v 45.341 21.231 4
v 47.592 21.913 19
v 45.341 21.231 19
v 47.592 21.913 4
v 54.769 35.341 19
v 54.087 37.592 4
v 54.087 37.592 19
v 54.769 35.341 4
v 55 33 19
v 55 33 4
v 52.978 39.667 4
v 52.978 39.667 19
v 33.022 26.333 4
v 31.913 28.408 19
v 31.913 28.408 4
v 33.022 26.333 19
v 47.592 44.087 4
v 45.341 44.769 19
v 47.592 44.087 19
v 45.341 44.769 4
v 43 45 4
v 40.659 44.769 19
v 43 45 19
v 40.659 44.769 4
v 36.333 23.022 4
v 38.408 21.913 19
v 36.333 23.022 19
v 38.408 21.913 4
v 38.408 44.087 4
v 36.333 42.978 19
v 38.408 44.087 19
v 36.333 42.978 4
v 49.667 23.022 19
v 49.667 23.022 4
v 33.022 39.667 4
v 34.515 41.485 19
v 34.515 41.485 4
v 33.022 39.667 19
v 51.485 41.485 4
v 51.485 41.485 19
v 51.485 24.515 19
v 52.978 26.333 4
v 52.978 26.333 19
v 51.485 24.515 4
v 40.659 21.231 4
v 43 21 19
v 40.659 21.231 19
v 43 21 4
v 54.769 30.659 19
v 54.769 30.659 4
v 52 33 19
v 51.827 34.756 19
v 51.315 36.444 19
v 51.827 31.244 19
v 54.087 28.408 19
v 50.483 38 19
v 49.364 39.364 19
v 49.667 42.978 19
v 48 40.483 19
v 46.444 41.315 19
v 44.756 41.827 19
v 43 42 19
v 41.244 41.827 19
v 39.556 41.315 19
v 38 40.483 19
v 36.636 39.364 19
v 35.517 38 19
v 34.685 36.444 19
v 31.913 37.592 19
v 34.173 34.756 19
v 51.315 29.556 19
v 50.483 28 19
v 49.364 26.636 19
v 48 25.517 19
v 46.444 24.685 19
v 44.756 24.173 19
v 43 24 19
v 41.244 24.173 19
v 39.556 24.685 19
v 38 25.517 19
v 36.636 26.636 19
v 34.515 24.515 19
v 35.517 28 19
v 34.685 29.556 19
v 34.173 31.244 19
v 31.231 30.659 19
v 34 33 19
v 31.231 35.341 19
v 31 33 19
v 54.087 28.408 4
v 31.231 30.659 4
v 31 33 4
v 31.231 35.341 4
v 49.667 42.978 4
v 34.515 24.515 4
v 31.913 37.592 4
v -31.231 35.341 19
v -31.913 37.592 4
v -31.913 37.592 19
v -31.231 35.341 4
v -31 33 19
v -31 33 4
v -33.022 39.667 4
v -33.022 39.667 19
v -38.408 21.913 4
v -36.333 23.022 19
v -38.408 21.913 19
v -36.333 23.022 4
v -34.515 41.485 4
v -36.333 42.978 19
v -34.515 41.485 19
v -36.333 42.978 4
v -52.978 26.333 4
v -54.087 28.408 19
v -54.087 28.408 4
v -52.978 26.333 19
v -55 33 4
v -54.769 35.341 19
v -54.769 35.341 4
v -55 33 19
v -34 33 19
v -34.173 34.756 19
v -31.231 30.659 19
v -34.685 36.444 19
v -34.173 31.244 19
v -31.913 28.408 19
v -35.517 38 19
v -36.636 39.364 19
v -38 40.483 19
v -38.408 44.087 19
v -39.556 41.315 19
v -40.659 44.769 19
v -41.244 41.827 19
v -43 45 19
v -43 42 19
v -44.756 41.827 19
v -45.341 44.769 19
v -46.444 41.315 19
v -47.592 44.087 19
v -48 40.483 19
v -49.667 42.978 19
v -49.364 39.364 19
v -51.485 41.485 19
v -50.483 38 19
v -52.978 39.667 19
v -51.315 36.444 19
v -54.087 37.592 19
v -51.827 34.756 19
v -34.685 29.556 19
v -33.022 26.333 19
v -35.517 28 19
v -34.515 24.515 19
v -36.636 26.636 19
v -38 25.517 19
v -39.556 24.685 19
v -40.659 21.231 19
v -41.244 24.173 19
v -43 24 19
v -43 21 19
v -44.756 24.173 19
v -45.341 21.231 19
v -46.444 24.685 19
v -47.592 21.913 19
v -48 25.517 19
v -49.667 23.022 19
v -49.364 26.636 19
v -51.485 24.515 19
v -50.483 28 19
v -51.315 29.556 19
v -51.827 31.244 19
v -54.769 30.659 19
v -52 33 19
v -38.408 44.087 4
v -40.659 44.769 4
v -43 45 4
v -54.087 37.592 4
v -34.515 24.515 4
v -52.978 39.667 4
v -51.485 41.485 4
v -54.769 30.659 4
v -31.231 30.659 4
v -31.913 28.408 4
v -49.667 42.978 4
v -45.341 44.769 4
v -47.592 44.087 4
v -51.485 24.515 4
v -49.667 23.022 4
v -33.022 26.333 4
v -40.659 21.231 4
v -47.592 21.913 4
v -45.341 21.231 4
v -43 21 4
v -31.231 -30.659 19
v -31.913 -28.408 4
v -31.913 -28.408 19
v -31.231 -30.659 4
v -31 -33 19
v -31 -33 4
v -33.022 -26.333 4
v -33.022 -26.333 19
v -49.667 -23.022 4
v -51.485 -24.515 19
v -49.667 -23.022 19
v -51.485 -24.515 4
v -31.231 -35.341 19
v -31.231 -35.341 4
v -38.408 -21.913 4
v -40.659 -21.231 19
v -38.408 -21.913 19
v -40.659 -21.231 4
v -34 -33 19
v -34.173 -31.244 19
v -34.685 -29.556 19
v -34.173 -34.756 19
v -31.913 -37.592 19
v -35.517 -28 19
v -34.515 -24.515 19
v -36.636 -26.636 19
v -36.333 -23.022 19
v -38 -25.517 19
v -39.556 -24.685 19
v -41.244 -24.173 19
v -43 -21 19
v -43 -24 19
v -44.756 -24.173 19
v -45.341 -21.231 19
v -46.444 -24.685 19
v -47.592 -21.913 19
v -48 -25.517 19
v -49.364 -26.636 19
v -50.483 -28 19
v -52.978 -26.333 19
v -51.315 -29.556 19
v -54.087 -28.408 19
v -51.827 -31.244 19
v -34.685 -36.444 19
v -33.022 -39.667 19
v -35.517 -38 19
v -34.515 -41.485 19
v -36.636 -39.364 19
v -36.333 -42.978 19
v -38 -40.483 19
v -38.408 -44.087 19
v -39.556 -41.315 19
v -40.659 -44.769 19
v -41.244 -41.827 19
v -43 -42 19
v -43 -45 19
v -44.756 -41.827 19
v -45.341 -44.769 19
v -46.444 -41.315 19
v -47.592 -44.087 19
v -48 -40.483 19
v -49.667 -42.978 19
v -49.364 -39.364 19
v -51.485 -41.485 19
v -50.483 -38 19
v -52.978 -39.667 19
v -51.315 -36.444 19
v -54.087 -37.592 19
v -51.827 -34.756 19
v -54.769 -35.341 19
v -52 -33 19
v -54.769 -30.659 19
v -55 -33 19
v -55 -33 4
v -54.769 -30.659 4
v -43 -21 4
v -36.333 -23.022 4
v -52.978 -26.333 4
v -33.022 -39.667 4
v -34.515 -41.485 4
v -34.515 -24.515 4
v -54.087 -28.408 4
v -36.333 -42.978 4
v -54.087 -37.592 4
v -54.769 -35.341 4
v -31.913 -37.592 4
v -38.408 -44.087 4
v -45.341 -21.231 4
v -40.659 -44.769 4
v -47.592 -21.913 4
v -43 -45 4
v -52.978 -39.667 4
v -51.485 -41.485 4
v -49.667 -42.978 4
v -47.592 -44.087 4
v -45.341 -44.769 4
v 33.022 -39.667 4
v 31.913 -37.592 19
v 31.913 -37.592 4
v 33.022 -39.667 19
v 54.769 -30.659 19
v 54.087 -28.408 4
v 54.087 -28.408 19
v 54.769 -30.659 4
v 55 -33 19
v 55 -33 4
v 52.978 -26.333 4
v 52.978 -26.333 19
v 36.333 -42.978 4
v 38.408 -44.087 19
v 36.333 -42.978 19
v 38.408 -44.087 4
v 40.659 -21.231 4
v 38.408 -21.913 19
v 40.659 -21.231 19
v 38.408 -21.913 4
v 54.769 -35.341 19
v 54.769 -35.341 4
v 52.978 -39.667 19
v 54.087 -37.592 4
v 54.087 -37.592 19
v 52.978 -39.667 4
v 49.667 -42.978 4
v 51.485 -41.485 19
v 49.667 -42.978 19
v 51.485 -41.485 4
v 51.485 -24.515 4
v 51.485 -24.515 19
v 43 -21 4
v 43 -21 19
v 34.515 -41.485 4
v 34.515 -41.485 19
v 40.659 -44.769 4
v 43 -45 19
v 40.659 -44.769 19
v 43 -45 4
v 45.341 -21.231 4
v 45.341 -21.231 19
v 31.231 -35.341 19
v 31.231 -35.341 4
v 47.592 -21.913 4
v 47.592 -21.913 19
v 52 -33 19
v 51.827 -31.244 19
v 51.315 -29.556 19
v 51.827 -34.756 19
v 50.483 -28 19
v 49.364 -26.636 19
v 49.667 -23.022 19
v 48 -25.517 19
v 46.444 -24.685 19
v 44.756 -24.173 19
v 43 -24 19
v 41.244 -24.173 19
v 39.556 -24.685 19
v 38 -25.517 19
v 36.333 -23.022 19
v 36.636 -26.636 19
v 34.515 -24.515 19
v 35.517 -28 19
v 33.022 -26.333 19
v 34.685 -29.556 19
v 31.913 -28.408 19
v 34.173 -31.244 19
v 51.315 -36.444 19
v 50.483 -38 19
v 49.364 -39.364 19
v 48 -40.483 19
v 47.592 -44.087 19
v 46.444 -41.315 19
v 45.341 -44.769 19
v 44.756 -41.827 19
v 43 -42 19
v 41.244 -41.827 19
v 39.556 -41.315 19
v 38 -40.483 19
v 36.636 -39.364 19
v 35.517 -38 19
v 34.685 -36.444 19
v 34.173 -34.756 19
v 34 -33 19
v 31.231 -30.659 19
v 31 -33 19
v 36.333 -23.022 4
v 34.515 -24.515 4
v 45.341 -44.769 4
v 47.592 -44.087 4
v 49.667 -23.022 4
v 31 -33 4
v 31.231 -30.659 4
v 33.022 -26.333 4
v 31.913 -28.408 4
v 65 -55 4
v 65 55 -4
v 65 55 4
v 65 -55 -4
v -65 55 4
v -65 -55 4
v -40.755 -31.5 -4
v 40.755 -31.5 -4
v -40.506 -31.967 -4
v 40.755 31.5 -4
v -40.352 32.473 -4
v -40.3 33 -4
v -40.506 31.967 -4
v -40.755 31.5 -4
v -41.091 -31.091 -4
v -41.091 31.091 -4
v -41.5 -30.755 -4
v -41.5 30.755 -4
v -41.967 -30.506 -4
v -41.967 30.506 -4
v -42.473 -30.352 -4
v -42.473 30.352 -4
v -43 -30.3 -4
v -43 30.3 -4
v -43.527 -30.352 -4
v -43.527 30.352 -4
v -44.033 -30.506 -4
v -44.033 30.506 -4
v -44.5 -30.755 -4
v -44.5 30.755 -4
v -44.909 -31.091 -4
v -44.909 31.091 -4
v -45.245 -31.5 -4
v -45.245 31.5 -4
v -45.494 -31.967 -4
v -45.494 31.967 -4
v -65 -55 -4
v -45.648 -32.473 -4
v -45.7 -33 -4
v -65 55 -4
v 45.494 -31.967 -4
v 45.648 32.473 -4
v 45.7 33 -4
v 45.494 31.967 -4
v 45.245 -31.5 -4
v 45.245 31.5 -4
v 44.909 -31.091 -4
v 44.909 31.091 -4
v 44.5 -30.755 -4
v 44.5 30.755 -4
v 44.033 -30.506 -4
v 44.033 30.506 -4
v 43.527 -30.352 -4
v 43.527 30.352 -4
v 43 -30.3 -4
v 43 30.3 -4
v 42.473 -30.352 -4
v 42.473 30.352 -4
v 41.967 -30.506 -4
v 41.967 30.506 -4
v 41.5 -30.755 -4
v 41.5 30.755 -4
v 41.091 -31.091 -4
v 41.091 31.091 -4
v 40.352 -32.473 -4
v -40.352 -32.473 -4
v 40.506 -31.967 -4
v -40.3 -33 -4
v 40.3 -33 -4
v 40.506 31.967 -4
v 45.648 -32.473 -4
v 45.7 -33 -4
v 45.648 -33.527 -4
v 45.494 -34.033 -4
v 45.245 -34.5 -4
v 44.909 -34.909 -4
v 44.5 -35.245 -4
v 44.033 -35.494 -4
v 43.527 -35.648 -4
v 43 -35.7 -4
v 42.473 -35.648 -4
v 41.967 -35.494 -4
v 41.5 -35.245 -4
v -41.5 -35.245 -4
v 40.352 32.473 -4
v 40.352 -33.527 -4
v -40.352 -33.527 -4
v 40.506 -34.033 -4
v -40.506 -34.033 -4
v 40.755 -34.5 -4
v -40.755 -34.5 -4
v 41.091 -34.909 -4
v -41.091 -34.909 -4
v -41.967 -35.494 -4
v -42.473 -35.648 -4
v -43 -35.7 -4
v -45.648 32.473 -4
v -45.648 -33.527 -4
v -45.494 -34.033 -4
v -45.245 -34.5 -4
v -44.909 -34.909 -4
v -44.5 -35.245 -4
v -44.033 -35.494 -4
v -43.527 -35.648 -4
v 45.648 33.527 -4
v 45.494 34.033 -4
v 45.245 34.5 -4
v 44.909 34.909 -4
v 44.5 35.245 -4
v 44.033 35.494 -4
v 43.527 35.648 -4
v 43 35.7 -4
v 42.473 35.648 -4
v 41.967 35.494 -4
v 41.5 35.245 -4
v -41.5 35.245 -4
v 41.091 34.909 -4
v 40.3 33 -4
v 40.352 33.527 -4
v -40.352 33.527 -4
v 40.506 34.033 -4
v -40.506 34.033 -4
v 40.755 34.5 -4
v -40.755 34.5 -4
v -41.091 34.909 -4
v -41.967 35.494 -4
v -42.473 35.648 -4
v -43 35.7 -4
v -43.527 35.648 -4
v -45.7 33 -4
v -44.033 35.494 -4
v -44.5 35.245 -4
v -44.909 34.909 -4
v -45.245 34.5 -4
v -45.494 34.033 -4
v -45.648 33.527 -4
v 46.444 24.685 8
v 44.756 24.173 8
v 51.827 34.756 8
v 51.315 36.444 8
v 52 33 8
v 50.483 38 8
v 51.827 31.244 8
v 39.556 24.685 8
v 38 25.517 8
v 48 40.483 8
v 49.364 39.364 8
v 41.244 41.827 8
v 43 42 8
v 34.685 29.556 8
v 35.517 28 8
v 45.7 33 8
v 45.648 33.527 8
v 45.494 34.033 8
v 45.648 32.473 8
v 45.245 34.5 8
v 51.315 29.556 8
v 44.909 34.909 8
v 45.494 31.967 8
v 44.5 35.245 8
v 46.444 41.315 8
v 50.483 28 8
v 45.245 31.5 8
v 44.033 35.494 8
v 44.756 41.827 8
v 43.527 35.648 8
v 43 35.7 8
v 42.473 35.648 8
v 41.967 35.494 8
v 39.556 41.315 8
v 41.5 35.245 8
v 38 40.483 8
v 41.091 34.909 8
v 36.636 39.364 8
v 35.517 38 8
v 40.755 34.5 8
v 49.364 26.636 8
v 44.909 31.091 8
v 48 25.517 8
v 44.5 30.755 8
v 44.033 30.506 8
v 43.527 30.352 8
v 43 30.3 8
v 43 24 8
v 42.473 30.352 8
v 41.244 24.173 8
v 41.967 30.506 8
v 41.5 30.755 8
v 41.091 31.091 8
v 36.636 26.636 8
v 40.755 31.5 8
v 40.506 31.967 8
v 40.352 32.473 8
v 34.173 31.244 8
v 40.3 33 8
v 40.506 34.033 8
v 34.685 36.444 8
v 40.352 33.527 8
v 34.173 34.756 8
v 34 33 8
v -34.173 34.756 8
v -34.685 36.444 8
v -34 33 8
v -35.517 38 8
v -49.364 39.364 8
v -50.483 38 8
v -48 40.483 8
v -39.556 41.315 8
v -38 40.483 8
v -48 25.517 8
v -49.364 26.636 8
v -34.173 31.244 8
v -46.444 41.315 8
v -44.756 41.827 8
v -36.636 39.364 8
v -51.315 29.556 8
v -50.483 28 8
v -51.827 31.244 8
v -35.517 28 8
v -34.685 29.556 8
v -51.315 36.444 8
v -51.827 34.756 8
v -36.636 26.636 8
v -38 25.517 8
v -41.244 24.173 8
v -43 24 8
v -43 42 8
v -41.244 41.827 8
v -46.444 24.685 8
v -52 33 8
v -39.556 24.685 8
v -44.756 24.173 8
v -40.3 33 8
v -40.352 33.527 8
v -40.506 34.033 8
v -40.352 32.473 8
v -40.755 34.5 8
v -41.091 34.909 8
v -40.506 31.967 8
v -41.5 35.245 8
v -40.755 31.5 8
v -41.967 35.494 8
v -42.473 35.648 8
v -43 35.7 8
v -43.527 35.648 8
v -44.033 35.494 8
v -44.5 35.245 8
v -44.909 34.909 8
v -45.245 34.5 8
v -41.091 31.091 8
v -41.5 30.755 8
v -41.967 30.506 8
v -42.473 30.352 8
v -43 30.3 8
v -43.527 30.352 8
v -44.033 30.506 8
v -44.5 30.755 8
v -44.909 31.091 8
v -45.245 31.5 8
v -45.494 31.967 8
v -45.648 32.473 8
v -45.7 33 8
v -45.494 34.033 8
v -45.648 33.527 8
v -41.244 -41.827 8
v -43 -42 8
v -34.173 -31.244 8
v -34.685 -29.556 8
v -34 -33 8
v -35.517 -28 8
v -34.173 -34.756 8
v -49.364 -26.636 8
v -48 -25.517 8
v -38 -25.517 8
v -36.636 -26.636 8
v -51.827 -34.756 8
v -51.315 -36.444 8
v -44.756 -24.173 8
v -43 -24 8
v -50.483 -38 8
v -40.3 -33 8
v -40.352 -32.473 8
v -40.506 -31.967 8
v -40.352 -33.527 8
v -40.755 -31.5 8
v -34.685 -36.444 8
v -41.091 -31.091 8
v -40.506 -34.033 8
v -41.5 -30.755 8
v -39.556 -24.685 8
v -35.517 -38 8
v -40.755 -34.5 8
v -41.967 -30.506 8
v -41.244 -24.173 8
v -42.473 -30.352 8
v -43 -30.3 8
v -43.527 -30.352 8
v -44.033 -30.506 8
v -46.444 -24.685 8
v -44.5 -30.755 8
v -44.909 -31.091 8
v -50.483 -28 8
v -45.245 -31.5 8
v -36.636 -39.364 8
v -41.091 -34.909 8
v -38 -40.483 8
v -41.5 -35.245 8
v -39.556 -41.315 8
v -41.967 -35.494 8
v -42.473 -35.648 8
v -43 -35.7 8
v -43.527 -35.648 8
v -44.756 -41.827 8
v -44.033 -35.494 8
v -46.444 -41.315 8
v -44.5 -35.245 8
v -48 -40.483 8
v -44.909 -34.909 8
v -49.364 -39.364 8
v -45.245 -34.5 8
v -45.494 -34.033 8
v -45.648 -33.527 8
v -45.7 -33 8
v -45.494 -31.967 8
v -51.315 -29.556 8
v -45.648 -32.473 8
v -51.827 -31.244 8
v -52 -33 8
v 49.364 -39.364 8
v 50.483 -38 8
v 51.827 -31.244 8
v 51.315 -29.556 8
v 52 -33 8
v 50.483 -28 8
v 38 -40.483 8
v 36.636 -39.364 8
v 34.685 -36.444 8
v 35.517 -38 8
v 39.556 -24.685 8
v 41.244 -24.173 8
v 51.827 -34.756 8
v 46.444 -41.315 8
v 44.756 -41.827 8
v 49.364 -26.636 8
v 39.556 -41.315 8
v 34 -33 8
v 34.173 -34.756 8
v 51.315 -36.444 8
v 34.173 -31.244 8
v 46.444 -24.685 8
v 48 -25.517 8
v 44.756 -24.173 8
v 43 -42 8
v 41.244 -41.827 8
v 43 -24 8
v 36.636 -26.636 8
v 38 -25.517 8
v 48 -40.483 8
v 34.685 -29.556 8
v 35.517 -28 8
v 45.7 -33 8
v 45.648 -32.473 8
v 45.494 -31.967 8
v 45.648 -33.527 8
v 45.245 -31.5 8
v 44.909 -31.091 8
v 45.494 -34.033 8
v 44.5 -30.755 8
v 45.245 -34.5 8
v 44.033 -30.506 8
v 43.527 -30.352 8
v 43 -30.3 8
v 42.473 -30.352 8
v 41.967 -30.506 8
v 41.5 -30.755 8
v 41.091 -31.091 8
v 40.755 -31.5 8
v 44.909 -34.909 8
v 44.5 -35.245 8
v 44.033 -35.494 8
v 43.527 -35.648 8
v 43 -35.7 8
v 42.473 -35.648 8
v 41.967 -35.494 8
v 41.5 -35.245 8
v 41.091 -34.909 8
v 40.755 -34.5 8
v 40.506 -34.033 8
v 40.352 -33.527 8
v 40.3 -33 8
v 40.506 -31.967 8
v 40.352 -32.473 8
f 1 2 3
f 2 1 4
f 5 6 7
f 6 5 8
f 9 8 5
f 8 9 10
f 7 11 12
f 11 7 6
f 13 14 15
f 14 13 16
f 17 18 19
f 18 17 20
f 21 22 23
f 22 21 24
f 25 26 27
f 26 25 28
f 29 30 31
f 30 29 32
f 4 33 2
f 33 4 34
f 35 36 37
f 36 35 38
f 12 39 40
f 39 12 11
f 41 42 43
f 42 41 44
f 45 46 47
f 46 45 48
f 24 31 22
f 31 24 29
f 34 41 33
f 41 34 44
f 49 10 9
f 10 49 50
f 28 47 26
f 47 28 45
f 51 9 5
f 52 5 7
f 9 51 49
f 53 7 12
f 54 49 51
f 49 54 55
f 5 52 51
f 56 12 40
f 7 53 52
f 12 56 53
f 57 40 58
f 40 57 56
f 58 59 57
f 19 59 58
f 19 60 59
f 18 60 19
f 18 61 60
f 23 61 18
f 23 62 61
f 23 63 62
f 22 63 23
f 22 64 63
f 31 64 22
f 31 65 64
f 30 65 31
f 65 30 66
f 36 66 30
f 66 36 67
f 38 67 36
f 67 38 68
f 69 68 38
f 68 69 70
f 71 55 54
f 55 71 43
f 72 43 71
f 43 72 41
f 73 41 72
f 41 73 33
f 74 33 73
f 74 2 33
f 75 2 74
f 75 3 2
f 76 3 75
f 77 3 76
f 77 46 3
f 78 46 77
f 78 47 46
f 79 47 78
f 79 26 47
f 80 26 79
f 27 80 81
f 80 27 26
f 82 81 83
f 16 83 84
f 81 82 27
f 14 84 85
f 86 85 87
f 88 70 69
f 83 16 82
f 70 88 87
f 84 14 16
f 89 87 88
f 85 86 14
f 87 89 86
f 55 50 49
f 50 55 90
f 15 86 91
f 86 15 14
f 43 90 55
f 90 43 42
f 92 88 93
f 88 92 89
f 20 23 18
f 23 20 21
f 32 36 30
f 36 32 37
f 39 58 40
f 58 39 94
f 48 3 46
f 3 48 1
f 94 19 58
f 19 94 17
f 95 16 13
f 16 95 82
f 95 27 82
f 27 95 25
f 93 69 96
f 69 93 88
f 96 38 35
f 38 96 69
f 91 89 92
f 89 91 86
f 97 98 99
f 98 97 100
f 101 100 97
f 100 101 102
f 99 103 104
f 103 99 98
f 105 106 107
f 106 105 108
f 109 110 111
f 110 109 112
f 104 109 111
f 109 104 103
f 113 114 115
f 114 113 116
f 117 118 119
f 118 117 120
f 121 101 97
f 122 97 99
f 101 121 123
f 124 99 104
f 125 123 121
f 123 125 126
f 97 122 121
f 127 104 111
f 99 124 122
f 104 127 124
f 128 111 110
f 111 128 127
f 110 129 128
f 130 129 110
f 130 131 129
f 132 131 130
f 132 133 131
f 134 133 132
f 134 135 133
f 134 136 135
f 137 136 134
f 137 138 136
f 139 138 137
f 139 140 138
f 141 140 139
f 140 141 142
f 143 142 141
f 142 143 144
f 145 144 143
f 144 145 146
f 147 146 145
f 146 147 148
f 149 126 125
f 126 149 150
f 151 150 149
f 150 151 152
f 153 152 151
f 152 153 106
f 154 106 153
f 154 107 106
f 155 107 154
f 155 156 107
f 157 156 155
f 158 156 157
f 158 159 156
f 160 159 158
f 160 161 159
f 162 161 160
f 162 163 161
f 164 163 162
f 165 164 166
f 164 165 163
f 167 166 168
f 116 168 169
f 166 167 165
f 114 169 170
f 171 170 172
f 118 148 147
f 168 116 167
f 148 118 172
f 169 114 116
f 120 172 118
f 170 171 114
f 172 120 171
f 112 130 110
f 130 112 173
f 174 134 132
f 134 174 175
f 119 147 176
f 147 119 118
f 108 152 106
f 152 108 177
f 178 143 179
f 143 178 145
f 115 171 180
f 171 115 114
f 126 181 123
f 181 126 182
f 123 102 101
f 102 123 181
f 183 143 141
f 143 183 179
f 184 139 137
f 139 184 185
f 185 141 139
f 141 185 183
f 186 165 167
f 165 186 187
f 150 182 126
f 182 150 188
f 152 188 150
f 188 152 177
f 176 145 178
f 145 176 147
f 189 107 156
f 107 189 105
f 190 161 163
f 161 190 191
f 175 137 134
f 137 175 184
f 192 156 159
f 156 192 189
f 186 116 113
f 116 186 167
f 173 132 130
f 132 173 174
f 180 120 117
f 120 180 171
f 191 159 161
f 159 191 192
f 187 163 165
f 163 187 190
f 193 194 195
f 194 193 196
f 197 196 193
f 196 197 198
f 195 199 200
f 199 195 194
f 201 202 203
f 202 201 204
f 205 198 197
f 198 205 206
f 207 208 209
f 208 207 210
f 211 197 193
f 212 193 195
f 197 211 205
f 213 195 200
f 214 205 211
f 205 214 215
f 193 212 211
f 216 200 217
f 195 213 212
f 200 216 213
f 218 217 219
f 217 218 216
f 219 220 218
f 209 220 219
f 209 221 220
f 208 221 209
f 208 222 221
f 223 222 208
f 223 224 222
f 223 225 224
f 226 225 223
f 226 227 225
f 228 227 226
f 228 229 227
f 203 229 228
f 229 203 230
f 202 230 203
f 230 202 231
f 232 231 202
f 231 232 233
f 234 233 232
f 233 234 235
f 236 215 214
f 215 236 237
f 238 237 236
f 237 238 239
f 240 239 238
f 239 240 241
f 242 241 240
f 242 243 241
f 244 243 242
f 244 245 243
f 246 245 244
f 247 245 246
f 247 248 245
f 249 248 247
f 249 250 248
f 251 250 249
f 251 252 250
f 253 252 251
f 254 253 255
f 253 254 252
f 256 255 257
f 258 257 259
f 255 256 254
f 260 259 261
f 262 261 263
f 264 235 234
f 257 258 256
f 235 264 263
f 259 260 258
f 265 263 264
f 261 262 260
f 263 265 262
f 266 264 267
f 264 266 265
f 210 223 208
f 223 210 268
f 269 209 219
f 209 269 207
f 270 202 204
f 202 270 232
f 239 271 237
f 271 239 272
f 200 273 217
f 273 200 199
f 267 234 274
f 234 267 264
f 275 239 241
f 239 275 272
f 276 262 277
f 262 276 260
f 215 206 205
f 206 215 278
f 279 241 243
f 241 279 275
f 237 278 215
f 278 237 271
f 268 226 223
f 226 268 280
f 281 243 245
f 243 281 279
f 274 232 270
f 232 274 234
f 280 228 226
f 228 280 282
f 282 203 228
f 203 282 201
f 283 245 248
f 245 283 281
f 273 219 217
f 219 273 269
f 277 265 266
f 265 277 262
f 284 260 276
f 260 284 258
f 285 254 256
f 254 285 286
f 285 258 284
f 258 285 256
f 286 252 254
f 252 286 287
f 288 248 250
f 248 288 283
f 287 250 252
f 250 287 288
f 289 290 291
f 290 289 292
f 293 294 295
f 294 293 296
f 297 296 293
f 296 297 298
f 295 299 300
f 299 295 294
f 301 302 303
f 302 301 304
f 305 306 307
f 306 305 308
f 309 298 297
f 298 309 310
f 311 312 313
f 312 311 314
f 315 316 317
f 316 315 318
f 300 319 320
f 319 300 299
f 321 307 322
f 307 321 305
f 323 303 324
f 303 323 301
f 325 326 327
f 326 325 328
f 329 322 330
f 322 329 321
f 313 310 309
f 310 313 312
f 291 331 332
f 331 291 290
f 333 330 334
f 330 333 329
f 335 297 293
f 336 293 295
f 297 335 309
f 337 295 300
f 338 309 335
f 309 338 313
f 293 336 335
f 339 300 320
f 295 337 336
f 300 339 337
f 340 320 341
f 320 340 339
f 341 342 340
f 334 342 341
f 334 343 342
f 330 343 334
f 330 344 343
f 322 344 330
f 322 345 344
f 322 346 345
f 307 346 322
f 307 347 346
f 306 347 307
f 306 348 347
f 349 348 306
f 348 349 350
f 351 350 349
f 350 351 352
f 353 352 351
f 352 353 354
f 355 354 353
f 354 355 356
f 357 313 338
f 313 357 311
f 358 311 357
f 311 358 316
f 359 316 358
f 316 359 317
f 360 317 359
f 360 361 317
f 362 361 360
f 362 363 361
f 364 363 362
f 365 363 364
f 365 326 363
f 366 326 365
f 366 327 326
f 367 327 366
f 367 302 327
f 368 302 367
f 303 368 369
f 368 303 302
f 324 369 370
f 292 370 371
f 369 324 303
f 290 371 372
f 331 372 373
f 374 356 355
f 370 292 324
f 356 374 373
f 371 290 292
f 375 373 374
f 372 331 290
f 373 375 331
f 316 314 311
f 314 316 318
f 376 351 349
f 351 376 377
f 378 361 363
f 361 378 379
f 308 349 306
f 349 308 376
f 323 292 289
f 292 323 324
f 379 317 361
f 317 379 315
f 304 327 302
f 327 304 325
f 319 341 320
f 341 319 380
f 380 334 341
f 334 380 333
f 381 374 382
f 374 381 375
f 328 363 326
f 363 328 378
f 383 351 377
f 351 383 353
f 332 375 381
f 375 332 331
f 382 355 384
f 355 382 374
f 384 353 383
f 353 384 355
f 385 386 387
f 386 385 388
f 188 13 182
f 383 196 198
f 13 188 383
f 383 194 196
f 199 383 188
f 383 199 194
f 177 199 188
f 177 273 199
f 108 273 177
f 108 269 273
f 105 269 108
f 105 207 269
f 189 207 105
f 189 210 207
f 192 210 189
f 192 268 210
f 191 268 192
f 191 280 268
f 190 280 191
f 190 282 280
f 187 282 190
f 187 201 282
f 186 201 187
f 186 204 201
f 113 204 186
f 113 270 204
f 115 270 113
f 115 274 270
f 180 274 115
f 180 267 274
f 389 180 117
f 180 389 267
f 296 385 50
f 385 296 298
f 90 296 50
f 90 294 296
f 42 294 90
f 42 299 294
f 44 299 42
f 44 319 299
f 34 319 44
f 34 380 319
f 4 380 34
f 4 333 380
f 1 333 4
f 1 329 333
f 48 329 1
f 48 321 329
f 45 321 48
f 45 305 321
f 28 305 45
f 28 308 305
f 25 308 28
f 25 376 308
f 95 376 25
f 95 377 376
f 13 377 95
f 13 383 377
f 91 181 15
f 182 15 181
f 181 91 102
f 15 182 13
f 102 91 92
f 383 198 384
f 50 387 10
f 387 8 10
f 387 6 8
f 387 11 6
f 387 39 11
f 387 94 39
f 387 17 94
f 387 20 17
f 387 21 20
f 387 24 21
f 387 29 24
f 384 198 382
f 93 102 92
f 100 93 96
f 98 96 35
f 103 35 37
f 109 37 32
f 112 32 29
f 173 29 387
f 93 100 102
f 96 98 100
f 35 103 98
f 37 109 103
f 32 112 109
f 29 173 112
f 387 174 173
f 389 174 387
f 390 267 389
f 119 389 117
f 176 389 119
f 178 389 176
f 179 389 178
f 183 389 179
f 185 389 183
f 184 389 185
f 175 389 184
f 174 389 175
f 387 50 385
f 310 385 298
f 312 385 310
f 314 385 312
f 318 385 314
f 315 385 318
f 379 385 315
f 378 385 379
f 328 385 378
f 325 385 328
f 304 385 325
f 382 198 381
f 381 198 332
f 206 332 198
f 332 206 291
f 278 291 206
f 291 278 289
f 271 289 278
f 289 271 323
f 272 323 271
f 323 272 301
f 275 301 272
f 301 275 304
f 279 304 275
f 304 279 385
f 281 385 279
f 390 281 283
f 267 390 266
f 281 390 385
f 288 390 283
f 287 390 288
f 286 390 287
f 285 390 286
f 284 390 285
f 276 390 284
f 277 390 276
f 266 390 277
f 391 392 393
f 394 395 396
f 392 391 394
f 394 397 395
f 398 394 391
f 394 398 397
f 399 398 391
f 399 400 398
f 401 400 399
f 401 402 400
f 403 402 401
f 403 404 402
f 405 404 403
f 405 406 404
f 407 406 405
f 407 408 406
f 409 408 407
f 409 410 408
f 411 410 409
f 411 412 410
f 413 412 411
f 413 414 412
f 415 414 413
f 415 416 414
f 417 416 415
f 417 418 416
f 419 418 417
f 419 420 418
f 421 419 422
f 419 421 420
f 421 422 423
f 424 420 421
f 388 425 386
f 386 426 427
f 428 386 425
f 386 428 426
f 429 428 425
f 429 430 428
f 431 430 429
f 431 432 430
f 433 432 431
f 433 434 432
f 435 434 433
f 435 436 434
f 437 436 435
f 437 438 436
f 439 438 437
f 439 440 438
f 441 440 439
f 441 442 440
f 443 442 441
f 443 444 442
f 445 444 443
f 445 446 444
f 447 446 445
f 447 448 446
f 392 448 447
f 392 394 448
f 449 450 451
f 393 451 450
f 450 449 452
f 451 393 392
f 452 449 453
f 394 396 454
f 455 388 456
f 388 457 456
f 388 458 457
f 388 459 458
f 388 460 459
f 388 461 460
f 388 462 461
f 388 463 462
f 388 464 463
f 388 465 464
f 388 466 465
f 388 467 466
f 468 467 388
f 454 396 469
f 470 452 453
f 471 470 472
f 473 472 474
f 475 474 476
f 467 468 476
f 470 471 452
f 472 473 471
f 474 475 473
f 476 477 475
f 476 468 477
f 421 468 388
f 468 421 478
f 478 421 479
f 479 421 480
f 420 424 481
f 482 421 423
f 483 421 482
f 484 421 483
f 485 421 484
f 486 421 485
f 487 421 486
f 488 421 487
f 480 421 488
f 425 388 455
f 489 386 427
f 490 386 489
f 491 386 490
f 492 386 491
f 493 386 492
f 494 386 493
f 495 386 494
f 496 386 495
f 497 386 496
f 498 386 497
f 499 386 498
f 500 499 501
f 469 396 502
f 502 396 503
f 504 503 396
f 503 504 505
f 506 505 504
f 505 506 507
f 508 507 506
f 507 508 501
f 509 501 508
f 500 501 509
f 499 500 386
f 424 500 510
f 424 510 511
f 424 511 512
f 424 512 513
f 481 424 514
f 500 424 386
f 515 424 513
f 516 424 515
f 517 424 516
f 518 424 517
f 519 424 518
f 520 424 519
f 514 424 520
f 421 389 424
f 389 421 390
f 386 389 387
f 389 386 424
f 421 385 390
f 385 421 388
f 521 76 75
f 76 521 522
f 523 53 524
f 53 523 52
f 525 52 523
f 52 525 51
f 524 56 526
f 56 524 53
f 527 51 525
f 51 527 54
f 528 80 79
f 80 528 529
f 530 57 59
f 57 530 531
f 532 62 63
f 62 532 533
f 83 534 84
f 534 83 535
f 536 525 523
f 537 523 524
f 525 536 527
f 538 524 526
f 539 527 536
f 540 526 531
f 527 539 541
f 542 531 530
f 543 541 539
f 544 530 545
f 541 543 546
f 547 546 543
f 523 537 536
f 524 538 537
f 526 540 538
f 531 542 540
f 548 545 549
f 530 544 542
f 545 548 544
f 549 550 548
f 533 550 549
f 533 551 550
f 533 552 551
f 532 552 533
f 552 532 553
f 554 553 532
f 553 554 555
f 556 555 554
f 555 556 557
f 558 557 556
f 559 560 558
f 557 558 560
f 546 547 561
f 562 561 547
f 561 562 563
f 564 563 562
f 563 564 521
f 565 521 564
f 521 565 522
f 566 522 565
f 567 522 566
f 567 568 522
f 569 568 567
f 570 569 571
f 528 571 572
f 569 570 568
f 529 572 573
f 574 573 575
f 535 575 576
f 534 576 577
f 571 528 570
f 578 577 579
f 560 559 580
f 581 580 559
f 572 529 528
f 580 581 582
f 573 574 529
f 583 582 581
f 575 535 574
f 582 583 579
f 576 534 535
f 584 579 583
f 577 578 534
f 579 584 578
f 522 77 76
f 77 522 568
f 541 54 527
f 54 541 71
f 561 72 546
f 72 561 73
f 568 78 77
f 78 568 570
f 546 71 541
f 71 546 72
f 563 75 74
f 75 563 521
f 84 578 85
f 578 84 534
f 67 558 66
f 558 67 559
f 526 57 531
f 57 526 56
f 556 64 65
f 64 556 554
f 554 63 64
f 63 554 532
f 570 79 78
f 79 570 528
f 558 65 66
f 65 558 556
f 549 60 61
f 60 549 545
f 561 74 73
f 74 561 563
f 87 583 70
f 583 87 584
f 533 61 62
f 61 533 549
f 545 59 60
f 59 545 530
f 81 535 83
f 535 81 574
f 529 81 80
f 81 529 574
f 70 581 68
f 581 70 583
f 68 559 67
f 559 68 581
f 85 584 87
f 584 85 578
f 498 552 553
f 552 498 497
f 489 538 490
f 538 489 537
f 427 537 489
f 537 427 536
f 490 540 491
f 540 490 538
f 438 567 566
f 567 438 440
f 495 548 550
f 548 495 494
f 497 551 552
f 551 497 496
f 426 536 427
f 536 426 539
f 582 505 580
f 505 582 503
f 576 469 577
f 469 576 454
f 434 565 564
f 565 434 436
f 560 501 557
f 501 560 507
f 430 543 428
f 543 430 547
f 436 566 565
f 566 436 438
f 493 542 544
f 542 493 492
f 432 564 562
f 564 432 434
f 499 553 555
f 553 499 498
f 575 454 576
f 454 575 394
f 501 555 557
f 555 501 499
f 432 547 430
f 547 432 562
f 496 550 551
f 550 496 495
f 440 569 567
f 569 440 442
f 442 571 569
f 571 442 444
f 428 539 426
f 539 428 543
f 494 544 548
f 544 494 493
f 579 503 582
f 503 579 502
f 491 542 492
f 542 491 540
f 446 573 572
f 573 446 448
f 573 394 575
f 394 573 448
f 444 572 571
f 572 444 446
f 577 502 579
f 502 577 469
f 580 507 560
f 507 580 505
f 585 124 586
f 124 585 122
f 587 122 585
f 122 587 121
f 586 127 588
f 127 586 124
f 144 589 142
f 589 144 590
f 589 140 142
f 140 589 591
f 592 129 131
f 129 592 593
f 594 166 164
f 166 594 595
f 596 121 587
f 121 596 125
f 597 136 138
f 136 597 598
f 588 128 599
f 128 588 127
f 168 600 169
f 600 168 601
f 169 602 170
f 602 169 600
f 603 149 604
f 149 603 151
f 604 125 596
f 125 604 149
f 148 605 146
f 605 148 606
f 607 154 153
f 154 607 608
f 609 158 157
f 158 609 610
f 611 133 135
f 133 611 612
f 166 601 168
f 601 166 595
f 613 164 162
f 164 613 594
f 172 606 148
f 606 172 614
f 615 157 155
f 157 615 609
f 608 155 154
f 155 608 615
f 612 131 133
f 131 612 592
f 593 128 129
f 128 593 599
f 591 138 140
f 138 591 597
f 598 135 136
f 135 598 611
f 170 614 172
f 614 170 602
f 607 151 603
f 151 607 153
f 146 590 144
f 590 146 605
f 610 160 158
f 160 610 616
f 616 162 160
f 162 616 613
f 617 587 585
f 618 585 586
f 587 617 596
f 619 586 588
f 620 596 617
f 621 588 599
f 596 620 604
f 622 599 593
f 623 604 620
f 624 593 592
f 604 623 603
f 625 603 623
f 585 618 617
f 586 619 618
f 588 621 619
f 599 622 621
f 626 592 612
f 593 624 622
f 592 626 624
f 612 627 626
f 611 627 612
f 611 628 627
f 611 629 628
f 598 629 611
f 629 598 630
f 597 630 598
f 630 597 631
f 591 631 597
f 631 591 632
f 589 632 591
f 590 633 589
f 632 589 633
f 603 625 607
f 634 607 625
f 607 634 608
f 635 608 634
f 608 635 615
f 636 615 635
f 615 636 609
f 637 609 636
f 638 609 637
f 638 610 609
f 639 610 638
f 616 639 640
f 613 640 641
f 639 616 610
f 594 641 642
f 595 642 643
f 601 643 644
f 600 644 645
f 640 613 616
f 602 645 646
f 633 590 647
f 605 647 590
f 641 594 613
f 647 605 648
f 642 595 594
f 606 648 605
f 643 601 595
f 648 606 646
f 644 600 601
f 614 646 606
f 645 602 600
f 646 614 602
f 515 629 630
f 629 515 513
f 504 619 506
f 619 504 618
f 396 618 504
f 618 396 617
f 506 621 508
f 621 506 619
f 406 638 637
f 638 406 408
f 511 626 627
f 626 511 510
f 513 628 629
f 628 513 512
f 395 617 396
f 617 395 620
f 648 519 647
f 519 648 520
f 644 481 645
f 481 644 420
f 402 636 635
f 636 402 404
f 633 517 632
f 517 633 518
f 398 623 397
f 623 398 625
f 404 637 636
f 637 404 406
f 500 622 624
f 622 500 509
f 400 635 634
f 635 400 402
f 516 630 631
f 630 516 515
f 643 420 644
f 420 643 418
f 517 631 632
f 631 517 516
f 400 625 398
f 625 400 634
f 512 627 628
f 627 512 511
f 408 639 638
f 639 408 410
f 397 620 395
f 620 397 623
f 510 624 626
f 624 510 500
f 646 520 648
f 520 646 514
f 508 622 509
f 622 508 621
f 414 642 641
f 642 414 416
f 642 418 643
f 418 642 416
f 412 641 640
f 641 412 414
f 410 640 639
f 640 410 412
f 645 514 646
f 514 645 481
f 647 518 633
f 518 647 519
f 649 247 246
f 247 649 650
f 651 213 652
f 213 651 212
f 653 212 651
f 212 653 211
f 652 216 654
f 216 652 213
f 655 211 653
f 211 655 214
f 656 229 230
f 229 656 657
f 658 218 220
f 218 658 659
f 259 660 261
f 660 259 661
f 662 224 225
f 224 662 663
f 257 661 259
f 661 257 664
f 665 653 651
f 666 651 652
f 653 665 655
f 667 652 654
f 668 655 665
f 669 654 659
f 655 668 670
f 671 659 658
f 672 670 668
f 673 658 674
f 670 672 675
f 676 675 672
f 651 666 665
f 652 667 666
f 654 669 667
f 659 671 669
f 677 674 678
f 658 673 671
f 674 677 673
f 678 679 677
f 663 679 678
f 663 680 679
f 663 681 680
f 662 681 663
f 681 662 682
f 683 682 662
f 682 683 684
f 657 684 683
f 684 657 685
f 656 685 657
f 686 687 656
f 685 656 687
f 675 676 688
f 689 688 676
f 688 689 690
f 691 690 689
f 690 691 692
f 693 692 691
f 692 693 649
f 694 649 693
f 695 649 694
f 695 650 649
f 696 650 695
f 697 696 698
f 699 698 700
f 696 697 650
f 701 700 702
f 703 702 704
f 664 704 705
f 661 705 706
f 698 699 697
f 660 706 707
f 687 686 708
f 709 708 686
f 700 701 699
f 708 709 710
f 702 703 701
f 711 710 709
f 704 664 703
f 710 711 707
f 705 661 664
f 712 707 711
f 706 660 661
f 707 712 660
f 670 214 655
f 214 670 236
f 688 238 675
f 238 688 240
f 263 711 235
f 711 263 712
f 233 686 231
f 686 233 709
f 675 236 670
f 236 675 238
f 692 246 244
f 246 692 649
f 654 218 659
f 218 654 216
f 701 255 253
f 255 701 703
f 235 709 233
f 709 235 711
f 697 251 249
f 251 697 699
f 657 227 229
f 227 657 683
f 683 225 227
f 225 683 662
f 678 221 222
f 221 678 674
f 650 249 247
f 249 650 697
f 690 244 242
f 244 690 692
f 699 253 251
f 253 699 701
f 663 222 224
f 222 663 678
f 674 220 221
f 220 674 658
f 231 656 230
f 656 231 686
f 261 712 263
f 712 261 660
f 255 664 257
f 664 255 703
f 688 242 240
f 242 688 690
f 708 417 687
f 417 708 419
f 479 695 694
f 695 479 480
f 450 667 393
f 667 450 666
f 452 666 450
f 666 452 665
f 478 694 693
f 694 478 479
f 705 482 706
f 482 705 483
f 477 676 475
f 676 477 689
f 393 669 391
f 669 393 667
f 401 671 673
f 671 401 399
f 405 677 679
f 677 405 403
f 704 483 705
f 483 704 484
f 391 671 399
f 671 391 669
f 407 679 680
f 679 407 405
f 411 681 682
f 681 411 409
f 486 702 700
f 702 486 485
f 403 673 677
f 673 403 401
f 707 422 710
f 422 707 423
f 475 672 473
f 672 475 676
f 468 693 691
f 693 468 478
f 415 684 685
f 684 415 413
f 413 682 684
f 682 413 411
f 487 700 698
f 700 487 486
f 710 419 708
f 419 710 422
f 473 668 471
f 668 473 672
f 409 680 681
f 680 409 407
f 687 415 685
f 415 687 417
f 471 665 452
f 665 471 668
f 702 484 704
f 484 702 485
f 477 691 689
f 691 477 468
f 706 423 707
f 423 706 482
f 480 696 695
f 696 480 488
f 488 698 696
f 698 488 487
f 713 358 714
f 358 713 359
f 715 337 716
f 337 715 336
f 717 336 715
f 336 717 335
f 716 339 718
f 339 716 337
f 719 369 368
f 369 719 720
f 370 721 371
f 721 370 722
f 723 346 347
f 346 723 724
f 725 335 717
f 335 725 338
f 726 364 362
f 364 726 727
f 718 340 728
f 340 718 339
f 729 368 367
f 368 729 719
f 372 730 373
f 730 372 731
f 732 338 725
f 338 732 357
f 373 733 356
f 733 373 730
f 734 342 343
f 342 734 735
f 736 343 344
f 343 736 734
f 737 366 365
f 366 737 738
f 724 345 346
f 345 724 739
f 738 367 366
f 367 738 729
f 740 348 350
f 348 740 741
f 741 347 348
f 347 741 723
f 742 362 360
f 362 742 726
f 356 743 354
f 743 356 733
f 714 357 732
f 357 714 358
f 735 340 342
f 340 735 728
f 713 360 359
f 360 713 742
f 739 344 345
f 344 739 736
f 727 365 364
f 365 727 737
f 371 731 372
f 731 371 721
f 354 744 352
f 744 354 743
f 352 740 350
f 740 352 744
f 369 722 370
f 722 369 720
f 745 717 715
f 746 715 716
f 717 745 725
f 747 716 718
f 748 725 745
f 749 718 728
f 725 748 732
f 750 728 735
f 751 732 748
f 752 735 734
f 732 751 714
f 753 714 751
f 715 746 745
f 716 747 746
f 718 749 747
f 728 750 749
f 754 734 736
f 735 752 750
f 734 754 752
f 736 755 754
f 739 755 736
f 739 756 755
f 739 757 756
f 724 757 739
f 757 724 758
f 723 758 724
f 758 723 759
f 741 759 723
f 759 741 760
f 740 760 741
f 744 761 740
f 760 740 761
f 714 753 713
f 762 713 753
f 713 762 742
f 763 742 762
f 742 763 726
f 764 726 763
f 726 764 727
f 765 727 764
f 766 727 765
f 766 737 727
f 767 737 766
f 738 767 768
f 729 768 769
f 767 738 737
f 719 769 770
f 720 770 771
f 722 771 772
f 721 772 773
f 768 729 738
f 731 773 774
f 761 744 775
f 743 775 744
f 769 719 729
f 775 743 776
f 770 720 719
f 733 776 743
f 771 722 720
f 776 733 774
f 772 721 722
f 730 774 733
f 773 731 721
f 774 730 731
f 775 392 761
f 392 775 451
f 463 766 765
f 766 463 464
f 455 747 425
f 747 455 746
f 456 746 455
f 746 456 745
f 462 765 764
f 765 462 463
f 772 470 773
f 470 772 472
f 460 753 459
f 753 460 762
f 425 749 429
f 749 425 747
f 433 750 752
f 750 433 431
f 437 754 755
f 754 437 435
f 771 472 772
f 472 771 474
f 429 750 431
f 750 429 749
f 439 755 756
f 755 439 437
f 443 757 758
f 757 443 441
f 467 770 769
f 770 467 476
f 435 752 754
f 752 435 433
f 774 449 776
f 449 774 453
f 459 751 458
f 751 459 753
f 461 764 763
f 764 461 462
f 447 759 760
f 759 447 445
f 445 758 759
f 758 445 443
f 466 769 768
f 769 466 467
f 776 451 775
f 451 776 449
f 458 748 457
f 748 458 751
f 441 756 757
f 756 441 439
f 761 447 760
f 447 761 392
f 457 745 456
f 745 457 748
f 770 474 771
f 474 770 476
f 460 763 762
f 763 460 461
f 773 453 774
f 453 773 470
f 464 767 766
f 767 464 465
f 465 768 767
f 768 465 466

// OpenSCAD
$fn = 32;

// ----------------------------------------------------------------------
// Socket pad plate
// bosses with counterbored sockets for the screws
// ----------------------------------------------------------------------

// --- parameters (mm) ---
base_t = 8;             // base plate thickness
boss_h = 15;            // boss height above the base plate
boss_d = 24;            // boss diameter
socket_d = 18;          // socket diameter
socket_depth = 11;      // socket depth from the boss face
bolt_d = 5.4;           // screw clearance hole through the socket floor
plate = [130, 110, 8];  // overall size (x, y, z)
edge = 22;              // boss centre offset from the plate edge
pads = 4;               // boss count, one per corner

// --- derived feature positions (mm) ---
height = base_t + boss_h;        // = 23   overall height of the part
corner_x = plate[0] / 2 - edge;  // = 43   boss centre X
corner_y = plate[1] / 2 - edge;  // = 33   boss centre Y
feature_centers = [
  [corner_x, corner_y],
  [-corner_x, corner_y],
  [-corner_x, -corner_y],
  [corner_x, -corner_y]
];   // boss centres: sockets, holes and the pads themselves are placed from here

// base plate, bosses on feature_centers, socket + through hole in each
difference() {
  union() {
    cube(plate, center = true);
    for (centre = feature_centers)
      translate([centre[0], centre[1], plate[2] / 2 - 1])
        cylinder(d = boss_d, h = boss_h + 1);
  }
  for (centre = feature_centers) {
    translate([centre[0], centre[1], plate[2] / 2 + boss_h - socket_depth])
      cylinder(d = socket_d, h = socket_depth + 1);
    translate([centre[0], centre[1], -height])
      cylinder(d = bolt_d, h = 2 * height + 2);  // through the socket floor
  }
}
